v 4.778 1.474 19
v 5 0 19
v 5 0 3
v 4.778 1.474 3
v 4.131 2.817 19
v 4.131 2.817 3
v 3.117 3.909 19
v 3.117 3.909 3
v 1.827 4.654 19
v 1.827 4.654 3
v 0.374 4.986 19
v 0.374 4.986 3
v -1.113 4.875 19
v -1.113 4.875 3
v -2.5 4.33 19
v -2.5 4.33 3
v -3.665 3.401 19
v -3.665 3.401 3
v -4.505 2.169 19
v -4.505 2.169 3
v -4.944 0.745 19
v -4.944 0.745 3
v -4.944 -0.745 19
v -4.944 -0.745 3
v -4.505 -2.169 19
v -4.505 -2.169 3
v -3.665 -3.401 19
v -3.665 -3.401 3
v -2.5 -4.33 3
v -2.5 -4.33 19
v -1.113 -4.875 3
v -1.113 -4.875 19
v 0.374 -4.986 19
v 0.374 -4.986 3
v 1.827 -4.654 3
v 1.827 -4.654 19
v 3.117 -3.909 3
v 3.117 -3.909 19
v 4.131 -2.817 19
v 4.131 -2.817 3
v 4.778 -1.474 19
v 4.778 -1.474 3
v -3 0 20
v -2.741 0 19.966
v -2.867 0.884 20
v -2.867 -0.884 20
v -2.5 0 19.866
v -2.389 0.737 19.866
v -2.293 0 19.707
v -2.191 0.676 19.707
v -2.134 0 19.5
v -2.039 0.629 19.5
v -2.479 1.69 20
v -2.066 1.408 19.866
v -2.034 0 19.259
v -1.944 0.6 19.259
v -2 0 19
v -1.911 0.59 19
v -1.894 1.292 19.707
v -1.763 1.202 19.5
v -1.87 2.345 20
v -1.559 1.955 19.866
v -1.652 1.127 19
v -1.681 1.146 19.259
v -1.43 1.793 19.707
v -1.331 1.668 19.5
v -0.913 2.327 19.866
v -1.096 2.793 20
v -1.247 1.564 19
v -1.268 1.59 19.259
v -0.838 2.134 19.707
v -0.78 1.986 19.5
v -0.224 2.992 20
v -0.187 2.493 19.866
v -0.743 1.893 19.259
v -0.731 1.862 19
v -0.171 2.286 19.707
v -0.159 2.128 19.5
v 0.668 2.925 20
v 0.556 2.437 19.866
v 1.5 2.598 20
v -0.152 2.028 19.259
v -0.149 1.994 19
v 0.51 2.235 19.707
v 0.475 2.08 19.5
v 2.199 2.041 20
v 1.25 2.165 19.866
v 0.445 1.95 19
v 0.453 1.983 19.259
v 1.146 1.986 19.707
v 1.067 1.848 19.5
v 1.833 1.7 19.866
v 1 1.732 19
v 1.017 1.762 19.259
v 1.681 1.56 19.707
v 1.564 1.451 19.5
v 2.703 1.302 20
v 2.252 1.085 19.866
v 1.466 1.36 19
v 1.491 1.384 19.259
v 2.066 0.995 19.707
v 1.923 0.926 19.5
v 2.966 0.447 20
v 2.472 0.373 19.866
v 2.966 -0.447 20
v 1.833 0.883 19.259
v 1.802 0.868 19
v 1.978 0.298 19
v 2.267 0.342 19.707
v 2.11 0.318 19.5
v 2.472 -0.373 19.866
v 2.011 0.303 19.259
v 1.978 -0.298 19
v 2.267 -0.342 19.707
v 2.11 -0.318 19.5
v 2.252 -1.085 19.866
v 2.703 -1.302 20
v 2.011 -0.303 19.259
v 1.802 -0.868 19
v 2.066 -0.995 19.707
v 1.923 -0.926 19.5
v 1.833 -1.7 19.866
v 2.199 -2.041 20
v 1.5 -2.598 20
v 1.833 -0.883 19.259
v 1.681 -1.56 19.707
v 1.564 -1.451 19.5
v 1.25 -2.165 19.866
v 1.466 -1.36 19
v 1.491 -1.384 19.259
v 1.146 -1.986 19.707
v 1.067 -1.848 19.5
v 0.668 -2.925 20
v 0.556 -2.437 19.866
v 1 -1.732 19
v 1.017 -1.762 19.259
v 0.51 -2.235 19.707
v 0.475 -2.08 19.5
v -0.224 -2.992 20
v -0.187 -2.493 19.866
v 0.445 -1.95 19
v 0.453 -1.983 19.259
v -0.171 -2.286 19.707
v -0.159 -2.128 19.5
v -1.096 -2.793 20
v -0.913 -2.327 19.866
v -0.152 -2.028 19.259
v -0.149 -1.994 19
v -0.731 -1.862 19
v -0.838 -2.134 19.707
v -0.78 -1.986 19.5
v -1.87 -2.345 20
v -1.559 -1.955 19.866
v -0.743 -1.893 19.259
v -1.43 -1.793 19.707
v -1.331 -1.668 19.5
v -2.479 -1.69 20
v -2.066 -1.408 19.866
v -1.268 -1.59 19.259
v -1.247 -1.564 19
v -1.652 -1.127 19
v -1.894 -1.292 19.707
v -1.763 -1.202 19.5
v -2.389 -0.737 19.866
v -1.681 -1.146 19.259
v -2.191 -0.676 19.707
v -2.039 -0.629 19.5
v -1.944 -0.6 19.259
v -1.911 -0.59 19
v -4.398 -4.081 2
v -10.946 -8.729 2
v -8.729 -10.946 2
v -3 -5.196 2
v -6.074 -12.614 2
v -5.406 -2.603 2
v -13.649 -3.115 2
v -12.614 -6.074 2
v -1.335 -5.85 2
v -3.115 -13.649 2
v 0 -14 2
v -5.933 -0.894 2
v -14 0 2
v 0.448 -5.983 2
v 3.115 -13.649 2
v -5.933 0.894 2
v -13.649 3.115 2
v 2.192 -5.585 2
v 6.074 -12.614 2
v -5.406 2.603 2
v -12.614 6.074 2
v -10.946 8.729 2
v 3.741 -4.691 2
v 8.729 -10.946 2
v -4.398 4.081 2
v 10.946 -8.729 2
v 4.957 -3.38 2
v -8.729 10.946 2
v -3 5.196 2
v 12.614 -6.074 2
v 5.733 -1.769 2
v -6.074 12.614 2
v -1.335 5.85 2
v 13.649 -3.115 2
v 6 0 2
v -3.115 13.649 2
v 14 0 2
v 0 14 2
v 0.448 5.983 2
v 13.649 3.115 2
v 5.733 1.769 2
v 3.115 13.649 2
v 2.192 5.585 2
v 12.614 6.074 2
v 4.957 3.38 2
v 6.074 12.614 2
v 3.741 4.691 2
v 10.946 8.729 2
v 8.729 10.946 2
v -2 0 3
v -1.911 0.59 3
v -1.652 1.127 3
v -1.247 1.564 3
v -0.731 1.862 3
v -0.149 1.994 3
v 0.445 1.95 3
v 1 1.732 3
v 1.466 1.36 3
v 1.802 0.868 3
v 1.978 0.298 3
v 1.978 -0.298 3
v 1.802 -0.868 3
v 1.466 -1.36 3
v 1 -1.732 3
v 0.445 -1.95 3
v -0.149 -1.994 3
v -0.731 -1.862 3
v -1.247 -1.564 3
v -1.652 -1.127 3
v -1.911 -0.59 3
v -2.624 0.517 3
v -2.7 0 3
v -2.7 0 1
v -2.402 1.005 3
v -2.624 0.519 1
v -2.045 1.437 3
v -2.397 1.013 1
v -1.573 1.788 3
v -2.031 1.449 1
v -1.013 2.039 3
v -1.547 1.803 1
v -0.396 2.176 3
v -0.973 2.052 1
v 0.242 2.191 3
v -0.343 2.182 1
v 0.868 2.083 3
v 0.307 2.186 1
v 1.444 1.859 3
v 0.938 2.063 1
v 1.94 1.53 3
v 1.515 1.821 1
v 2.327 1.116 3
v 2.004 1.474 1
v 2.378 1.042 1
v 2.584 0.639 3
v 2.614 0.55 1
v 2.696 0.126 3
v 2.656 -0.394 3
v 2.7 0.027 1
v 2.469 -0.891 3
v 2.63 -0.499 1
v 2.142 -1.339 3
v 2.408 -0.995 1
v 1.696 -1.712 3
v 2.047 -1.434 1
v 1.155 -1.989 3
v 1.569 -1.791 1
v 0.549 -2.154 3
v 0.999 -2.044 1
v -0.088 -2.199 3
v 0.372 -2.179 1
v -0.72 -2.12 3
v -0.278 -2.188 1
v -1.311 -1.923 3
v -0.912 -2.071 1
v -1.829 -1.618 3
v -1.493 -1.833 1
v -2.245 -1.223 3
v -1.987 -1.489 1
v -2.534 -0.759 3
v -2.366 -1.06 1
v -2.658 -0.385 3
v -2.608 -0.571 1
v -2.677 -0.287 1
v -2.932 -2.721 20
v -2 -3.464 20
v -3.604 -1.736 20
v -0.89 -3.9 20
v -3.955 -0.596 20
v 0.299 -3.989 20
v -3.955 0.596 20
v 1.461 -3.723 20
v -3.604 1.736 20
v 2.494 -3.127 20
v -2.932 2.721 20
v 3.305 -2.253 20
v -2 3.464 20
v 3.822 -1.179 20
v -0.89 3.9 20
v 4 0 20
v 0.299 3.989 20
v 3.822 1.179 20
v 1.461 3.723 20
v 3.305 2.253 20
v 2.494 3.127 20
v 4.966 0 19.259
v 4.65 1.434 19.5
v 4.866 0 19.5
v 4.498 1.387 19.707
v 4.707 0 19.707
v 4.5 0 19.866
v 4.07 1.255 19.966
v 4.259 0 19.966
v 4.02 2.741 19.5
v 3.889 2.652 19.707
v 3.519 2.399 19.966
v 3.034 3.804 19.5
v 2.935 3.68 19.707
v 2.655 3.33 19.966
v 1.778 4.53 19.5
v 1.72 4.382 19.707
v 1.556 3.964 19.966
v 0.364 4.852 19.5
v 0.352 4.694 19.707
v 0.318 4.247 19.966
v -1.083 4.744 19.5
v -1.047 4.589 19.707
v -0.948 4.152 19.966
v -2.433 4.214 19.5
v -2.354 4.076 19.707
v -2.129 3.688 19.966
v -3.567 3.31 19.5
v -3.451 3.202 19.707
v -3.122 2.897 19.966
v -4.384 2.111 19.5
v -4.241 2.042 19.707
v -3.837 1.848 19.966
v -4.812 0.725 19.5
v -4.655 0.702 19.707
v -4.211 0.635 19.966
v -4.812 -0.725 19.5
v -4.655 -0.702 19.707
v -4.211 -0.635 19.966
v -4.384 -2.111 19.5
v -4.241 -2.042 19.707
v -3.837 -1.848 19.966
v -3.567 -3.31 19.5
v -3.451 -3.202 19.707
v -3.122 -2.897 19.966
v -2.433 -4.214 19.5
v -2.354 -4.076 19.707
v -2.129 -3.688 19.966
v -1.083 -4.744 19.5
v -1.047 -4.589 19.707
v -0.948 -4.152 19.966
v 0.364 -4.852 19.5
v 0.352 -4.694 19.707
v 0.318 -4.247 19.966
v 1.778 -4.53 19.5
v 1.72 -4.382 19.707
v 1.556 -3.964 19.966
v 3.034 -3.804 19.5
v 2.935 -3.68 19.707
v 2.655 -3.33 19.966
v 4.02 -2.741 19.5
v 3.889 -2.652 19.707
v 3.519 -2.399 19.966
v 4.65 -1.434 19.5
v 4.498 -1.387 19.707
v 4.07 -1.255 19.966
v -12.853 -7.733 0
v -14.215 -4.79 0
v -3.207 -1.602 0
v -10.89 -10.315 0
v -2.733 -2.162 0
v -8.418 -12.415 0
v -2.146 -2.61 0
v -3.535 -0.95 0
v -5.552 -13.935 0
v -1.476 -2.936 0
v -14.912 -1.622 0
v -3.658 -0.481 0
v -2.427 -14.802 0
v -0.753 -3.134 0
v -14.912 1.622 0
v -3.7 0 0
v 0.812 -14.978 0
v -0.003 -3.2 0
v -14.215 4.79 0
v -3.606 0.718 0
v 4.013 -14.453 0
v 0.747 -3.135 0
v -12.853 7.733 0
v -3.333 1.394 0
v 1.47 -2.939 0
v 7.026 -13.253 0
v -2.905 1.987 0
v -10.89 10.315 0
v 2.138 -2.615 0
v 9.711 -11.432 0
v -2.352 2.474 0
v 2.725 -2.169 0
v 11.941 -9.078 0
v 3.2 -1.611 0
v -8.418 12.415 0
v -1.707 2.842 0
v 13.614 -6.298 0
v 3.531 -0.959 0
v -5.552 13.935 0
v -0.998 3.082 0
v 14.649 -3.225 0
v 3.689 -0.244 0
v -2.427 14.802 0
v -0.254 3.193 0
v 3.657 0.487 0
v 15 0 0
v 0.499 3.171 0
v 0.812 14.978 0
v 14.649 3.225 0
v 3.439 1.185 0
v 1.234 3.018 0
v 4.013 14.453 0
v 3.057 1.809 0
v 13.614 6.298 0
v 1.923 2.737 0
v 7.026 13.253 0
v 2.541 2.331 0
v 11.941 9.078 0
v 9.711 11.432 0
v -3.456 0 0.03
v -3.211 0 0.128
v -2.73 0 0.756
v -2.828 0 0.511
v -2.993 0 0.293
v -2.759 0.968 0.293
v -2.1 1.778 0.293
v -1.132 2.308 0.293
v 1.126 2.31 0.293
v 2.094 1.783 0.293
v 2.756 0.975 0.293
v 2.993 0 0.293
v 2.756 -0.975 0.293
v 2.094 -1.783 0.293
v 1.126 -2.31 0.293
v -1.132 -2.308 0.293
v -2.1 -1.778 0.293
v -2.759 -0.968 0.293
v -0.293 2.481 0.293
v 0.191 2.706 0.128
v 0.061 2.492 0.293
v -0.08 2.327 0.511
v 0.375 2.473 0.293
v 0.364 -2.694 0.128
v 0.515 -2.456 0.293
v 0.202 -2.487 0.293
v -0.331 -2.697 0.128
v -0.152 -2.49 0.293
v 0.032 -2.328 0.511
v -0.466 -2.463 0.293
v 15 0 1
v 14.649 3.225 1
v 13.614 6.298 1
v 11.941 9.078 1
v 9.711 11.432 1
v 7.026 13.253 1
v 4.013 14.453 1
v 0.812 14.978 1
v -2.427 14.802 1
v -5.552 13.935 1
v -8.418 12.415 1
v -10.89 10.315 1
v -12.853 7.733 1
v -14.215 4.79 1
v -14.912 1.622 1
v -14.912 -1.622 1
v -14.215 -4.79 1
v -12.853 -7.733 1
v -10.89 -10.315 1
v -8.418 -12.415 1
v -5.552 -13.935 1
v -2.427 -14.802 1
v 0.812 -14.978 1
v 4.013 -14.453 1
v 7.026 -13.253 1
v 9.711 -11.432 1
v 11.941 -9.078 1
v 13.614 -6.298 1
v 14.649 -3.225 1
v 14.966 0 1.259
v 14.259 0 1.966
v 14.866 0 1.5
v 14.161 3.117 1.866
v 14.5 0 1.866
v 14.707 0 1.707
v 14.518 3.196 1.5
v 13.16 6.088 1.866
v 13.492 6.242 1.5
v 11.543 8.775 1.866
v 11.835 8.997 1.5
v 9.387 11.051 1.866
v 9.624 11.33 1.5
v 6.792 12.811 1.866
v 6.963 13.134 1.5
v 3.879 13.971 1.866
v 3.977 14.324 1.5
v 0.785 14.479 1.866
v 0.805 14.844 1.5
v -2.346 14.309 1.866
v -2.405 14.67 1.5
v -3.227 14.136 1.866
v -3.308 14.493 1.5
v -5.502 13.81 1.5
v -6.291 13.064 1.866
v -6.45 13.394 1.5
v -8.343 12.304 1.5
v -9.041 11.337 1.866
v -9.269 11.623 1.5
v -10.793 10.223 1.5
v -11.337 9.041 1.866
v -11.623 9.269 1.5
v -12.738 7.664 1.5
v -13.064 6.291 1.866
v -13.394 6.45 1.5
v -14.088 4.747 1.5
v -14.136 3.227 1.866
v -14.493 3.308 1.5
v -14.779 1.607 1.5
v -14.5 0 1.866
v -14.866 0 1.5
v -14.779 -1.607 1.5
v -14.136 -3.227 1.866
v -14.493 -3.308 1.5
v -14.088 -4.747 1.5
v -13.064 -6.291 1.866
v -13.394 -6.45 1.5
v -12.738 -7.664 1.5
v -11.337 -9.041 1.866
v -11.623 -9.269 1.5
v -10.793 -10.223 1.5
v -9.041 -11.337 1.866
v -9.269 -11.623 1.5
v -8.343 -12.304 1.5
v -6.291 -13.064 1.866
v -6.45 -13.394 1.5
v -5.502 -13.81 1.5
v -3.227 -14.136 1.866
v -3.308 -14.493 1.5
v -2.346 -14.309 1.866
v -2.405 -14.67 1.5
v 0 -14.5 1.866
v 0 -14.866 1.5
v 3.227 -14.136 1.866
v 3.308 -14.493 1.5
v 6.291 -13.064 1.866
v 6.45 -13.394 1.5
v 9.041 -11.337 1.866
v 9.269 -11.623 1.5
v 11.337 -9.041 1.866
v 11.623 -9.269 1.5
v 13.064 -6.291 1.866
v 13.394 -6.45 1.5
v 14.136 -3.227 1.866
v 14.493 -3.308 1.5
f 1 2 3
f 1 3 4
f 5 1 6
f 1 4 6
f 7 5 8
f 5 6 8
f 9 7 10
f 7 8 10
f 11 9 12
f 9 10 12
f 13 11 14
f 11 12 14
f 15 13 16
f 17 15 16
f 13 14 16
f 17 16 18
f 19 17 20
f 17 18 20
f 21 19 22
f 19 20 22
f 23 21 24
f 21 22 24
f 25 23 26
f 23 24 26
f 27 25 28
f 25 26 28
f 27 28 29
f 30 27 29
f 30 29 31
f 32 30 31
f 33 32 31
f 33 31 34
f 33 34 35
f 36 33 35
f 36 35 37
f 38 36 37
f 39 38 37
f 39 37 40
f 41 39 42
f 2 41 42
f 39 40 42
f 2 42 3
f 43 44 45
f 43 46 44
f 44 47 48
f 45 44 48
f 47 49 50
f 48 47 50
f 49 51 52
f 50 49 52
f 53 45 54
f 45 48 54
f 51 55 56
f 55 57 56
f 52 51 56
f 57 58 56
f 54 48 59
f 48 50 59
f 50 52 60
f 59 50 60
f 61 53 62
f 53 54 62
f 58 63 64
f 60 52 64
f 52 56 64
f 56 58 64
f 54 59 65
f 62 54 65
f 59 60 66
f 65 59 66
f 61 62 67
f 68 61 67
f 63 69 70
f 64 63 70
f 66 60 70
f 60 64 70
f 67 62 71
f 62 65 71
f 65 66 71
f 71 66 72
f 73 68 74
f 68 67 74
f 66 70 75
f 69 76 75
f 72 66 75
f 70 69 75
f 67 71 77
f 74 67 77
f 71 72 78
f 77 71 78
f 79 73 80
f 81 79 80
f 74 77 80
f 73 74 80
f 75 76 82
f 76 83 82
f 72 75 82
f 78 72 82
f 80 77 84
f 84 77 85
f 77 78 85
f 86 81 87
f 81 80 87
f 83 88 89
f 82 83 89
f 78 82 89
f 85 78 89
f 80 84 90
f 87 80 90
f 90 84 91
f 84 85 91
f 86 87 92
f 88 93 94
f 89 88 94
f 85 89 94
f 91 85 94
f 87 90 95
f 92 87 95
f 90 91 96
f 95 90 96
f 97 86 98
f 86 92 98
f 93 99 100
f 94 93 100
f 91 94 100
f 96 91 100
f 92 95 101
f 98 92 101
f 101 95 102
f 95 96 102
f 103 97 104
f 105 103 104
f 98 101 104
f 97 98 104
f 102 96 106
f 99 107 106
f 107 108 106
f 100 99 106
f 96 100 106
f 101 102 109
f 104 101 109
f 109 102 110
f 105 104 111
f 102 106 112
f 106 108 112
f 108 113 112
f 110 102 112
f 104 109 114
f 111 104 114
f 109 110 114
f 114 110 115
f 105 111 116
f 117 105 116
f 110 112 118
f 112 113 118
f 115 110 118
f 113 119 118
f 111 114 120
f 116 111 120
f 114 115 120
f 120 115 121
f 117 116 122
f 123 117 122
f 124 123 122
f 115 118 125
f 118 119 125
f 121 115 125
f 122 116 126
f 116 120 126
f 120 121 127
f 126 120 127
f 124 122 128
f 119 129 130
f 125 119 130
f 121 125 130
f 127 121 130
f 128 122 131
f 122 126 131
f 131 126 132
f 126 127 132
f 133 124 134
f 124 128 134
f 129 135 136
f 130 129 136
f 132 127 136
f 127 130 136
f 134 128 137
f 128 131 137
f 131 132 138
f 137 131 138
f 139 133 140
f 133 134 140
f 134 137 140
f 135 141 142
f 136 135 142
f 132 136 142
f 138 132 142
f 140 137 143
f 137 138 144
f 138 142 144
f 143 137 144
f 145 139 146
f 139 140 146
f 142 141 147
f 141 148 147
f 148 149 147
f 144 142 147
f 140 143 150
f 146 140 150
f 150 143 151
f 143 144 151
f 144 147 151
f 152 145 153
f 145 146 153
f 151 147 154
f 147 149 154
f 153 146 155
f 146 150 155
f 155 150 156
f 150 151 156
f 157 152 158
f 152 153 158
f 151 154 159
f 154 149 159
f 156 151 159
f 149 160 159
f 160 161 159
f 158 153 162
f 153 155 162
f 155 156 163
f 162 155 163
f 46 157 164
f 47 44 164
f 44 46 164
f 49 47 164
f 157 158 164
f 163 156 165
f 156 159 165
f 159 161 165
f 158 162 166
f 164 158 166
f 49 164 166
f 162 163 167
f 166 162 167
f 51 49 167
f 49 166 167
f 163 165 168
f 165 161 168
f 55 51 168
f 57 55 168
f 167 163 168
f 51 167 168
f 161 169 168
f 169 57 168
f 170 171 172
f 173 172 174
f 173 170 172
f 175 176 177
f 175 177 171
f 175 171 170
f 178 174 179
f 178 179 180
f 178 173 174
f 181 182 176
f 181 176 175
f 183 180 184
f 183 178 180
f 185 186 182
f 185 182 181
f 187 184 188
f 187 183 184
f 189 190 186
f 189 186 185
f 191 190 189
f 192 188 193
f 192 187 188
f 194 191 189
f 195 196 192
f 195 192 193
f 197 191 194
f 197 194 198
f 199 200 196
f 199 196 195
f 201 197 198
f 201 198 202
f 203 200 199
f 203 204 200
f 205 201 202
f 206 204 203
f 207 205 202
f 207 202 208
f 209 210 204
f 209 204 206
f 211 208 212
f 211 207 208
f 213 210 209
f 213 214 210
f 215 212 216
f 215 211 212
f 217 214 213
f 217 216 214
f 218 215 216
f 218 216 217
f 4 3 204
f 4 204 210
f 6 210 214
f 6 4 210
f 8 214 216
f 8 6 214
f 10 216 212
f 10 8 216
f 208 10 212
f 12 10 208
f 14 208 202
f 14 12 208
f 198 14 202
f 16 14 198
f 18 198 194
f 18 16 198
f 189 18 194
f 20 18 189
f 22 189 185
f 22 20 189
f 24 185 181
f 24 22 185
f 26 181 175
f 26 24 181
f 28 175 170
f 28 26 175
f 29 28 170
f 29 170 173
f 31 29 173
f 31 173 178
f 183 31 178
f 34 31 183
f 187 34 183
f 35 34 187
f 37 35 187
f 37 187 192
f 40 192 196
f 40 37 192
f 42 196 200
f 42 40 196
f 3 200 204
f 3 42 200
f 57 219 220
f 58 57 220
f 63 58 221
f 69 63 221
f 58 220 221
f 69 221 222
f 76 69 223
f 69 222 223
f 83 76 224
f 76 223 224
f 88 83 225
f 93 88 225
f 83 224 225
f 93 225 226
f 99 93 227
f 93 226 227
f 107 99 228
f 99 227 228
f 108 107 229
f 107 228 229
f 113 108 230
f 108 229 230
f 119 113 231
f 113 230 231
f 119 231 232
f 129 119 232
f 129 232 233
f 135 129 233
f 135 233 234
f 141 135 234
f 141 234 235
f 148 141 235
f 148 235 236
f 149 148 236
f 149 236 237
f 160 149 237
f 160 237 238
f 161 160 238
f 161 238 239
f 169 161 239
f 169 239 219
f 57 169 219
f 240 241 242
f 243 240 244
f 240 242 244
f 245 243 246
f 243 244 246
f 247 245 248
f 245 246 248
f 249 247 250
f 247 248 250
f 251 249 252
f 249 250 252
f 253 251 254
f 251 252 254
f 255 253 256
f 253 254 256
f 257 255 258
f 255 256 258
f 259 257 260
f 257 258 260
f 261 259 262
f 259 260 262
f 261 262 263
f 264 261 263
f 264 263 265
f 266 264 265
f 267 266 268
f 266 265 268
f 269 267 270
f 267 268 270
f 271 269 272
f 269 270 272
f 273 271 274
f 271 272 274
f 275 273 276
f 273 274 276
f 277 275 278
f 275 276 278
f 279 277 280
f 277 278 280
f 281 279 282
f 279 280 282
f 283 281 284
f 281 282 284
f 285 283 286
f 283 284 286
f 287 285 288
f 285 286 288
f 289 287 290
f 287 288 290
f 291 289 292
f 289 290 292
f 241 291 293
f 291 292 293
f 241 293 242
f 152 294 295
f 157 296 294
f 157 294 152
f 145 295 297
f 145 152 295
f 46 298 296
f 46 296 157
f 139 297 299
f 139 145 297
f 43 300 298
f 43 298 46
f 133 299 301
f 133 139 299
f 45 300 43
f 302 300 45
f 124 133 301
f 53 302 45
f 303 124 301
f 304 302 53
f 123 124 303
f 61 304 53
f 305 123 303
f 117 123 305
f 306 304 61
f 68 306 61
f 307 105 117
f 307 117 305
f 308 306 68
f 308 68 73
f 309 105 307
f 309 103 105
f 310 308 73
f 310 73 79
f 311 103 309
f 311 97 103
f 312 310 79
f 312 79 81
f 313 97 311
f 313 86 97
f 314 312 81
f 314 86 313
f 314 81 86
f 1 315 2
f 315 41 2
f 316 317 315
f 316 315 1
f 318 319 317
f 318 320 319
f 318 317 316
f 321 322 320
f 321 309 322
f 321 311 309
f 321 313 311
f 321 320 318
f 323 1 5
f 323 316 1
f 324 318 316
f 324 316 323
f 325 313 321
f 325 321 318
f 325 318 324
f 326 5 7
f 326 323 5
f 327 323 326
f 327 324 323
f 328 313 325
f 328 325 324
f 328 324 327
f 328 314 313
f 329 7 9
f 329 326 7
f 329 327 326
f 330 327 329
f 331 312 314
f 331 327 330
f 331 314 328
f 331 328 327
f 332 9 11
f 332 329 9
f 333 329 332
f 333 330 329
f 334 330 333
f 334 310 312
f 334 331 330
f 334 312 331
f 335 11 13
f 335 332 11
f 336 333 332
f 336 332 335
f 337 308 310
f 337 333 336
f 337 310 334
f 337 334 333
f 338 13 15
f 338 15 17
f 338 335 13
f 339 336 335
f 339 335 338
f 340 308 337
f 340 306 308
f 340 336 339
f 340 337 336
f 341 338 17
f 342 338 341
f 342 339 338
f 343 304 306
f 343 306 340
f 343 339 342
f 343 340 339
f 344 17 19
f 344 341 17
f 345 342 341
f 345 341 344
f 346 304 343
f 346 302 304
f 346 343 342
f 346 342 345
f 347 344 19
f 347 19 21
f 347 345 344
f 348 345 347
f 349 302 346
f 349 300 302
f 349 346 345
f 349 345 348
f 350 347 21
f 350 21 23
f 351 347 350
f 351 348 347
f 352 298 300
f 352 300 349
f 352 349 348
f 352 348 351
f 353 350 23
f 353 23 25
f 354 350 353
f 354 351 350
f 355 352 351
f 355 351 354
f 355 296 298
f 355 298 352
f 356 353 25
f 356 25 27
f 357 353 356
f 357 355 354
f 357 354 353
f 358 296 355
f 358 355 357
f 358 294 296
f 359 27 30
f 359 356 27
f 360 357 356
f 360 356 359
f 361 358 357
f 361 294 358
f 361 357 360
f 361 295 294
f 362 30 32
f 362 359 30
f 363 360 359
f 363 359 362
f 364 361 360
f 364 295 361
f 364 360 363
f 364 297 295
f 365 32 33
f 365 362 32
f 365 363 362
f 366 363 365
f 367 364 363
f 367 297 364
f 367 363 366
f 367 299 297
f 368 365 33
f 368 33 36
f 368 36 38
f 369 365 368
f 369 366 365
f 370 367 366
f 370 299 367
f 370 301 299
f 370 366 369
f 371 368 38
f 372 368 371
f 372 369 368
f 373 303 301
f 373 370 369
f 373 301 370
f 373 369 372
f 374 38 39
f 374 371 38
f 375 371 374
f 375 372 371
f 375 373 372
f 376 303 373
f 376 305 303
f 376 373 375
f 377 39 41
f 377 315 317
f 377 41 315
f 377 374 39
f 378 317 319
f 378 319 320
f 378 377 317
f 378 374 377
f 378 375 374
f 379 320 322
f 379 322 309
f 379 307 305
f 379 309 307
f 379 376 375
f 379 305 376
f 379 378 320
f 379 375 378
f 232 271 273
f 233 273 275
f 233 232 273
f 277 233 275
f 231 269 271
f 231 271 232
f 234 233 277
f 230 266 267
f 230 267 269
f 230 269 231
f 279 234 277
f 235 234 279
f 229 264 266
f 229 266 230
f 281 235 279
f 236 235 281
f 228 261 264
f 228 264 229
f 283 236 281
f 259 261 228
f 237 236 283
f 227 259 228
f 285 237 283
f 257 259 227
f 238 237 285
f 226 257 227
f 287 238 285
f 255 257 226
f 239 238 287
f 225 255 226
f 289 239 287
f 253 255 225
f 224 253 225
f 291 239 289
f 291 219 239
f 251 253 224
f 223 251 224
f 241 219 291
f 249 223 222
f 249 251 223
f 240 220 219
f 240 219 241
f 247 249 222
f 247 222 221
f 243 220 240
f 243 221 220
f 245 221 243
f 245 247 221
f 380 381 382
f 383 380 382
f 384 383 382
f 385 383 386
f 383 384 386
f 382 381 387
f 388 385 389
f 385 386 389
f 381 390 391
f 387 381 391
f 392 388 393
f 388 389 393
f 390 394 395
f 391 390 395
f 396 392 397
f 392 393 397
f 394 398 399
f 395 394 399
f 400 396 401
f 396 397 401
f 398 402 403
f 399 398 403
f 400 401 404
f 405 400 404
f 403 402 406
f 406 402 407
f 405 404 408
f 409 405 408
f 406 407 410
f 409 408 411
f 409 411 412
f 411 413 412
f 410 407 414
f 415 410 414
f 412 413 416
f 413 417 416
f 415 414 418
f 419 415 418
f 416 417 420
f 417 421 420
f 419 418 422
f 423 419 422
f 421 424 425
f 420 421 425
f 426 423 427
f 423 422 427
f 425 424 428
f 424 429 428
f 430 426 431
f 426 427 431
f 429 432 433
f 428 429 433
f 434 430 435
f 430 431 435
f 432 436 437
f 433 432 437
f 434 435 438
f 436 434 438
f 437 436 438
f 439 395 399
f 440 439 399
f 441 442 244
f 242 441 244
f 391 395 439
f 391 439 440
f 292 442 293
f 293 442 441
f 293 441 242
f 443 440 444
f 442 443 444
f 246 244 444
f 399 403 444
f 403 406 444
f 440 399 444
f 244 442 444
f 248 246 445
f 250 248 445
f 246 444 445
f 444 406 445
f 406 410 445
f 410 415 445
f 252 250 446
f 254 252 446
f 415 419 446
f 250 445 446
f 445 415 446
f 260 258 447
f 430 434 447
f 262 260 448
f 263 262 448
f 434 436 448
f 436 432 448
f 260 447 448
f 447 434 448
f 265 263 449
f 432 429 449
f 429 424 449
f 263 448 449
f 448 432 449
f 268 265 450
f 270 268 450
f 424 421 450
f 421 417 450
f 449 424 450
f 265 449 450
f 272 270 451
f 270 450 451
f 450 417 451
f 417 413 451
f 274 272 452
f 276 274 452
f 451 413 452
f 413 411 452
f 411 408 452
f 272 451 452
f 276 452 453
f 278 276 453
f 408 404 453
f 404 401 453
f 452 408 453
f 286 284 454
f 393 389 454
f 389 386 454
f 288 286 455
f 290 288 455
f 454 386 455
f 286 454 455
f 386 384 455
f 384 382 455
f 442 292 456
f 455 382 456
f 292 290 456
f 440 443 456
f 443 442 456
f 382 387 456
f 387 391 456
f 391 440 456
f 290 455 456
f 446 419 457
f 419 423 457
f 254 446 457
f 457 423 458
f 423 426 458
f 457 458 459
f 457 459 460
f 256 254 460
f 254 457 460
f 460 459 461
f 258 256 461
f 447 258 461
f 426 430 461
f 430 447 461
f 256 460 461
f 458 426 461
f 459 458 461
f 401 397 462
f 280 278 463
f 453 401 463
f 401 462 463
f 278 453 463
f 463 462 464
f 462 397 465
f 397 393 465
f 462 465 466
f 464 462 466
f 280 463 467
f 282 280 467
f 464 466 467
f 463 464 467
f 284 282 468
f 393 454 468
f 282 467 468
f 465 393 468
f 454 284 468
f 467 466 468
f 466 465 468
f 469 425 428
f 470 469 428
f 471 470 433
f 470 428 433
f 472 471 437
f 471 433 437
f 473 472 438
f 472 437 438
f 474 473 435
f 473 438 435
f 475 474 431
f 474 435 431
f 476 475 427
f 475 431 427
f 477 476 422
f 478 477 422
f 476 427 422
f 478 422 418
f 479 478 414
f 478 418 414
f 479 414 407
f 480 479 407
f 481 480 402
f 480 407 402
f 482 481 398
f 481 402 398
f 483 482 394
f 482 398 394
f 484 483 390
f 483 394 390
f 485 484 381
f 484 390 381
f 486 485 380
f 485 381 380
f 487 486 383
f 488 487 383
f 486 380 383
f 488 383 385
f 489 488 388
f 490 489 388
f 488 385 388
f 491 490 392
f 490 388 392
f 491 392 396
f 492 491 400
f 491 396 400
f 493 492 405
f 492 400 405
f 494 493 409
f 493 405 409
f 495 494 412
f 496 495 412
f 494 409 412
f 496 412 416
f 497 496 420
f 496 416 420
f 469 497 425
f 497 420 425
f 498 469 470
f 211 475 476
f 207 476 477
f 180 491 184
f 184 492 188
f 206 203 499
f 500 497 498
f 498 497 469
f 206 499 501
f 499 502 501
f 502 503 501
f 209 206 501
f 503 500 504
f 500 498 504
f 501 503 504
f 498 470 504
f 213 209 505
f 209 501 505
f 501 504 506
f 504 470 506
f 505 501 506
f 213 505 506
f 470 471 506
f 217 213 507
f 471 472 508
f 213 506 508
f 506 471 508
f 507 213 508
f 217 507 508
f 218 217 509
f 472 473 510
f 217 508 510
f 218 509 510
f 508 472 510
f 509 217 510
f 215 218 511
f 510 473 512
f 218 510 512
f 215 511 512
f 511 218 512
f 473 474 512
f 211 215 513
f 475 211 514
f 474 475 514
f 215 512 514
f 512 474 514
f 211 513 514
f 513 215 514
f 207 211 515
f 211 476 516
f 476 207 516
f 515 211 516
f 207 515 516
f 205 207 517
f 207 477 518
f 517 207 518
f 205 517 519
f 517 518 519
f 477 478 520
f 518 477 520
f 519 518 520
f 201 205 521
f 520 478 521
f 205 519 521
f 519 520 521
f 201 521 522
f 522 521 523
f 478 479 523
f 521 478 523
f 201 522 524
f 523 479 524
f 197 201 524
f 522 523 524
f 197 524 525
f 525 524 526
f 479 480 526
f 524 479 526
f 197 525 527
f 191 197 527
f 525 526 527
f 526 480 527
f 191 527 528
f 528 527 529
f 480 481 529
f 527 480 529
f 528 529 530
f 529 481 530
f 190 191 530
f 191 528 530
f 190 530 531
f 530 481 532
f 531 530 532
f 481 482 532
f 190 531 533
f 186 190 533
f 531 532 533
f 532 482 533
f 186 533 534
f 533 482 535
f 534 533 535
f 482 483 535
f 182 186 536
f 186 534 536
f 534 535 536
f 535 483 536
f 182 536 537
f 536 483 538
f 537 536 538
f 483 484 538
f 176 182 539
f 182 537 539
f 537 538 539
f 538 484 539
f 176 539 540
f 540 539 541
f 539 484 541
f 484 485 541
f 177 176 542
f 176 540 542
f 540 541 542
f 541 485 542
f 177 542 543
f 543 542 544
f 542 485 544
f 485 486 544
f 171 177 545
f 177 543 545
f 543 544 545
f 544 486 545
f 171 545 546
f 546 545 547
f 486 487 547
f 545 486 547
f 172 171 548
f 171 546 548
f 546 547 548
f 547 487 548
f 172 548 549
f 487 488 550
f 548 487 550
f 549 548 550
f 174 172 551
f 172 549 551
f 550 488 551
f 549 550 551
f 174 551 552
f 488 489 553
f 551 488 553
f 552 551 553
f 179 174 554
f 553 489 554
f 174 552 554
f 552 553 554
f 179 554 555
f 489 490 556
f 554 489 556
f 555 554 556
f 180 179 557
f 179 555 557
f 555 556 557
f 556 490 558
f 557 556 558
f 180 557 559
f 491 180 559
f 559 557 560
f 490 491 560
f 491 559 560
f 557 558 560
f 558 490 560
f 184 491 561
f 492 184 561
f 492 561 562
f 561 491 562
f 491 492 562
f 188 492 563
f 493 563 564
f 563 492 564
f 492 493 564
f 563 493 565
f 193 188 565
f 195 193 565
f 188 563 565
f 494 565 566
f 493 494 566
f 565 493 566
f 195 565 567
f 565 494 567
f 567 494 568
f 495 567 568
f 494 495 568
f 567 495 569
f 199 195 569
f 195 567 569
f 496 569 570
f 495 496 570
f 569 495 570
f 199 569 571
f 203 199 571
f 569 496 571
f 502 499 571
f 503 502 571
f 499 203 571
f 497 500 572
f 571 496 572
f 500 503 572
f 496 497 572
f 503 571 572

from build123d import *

# Parameters (mm, degrees)
SKETCH1_R           = 15
BOSS_EXTRUDE1_DEPTH = 2
SKETCH2_R           = 5
BOSS_EXTRUDE2_DEPTH = 18
SKETCH3_RX          = 2.7
SKETCH3_RY          = 2.2
CUT_EXTRUDE1_DEPTH  = 3
SKETCH4_R           = 2
CUT_EXTRUDE2_DEPTH  = 30
FILLET2_R           = 1
CHAMFER1_SIZE       = 1
FILLET3_R           = 1
FILLET4_R           = 1
FILLET6_R           = 1


with BuildPart() as part:
    # Sketch1 → Boss-Extrude1 (new body)
    with BuildSketch(Plane.XY):
        Circle(SKETCH1_R)
    extrude(amount=BOSS_EXTRUDE1_DEPTH)

    # Sketch2 → Boss-Extrude2 (add)
    with BuildSketch(Plane.XY.offset(2)):
        Circle(SKETCH2_R)
    extrude(amount=BOSS_EXTRUDE2_DEPTH)

    # Sketch3 → Cut-Extrude1 (cut)
    with BuildSketch(Plane(origin=(0, 0, 0), x_dir=(-1, 0, 0), z_dir=(0, 0, -1))):
        with Locations(Location((0, 0), (0, 0, 0))):
            Ellipse(SKETCH3_RX, SKETCH3_RY)
    extrude(amount=-CUT_EXTRUDE1_DEPTH, mode=Mode.SUBTRACT)

    # Sketch4 → Cut-Extrude2 (cut)
    with BuildSketch(Plane(origin=(0, 0, 0), x_dir=(-1, 0, 0), z_dir=(0, 0, -1))):
        Circle(SKETCH4_R)
    extrude(amount=-CUT_EXTRUDE2_DEPTH, mode=Mode.SUBTRACT)

    # Fillet2
    fillet2_edges = [part.edges().sort_by_distance(p)[0] for p in [
        (2.699999981, -0.000263168, 0),
    ]]
    fillet(fillet2_edges, radius=FILLET2_R)

    # Chamfer1
    chamfer1_edges = [part.edges().sort_by_distance(p)[0] for p in [
        (-5, 0, 2),
    ]]
    chamfer(chamfer1_edges, length=CHAMFER1_SIZE)

    # Fillet3
    fillet3_edges = [part.edges().sort_by_distance(p)[0] for p in [
        (-15, 0, 2),
    ]]
    fillet(fillet3_edges, radius=FILLET3_R)

    # Fillet4
    fillet4_edges = [part.edges().sort_by_distance(p)[0] for p in [
        (-5, 0, 20),
    ]]
    fillet(fillet4_edges, radius=FILLET4_R)

    # Fillet6
    fillet6_edges = [part.edges().sort_by_distance(p)[0] for p in [
        (2, 0, 20),
    ]]
    fillet(fillet6_edges, radius=FILLET6_R)


solid = part.part
